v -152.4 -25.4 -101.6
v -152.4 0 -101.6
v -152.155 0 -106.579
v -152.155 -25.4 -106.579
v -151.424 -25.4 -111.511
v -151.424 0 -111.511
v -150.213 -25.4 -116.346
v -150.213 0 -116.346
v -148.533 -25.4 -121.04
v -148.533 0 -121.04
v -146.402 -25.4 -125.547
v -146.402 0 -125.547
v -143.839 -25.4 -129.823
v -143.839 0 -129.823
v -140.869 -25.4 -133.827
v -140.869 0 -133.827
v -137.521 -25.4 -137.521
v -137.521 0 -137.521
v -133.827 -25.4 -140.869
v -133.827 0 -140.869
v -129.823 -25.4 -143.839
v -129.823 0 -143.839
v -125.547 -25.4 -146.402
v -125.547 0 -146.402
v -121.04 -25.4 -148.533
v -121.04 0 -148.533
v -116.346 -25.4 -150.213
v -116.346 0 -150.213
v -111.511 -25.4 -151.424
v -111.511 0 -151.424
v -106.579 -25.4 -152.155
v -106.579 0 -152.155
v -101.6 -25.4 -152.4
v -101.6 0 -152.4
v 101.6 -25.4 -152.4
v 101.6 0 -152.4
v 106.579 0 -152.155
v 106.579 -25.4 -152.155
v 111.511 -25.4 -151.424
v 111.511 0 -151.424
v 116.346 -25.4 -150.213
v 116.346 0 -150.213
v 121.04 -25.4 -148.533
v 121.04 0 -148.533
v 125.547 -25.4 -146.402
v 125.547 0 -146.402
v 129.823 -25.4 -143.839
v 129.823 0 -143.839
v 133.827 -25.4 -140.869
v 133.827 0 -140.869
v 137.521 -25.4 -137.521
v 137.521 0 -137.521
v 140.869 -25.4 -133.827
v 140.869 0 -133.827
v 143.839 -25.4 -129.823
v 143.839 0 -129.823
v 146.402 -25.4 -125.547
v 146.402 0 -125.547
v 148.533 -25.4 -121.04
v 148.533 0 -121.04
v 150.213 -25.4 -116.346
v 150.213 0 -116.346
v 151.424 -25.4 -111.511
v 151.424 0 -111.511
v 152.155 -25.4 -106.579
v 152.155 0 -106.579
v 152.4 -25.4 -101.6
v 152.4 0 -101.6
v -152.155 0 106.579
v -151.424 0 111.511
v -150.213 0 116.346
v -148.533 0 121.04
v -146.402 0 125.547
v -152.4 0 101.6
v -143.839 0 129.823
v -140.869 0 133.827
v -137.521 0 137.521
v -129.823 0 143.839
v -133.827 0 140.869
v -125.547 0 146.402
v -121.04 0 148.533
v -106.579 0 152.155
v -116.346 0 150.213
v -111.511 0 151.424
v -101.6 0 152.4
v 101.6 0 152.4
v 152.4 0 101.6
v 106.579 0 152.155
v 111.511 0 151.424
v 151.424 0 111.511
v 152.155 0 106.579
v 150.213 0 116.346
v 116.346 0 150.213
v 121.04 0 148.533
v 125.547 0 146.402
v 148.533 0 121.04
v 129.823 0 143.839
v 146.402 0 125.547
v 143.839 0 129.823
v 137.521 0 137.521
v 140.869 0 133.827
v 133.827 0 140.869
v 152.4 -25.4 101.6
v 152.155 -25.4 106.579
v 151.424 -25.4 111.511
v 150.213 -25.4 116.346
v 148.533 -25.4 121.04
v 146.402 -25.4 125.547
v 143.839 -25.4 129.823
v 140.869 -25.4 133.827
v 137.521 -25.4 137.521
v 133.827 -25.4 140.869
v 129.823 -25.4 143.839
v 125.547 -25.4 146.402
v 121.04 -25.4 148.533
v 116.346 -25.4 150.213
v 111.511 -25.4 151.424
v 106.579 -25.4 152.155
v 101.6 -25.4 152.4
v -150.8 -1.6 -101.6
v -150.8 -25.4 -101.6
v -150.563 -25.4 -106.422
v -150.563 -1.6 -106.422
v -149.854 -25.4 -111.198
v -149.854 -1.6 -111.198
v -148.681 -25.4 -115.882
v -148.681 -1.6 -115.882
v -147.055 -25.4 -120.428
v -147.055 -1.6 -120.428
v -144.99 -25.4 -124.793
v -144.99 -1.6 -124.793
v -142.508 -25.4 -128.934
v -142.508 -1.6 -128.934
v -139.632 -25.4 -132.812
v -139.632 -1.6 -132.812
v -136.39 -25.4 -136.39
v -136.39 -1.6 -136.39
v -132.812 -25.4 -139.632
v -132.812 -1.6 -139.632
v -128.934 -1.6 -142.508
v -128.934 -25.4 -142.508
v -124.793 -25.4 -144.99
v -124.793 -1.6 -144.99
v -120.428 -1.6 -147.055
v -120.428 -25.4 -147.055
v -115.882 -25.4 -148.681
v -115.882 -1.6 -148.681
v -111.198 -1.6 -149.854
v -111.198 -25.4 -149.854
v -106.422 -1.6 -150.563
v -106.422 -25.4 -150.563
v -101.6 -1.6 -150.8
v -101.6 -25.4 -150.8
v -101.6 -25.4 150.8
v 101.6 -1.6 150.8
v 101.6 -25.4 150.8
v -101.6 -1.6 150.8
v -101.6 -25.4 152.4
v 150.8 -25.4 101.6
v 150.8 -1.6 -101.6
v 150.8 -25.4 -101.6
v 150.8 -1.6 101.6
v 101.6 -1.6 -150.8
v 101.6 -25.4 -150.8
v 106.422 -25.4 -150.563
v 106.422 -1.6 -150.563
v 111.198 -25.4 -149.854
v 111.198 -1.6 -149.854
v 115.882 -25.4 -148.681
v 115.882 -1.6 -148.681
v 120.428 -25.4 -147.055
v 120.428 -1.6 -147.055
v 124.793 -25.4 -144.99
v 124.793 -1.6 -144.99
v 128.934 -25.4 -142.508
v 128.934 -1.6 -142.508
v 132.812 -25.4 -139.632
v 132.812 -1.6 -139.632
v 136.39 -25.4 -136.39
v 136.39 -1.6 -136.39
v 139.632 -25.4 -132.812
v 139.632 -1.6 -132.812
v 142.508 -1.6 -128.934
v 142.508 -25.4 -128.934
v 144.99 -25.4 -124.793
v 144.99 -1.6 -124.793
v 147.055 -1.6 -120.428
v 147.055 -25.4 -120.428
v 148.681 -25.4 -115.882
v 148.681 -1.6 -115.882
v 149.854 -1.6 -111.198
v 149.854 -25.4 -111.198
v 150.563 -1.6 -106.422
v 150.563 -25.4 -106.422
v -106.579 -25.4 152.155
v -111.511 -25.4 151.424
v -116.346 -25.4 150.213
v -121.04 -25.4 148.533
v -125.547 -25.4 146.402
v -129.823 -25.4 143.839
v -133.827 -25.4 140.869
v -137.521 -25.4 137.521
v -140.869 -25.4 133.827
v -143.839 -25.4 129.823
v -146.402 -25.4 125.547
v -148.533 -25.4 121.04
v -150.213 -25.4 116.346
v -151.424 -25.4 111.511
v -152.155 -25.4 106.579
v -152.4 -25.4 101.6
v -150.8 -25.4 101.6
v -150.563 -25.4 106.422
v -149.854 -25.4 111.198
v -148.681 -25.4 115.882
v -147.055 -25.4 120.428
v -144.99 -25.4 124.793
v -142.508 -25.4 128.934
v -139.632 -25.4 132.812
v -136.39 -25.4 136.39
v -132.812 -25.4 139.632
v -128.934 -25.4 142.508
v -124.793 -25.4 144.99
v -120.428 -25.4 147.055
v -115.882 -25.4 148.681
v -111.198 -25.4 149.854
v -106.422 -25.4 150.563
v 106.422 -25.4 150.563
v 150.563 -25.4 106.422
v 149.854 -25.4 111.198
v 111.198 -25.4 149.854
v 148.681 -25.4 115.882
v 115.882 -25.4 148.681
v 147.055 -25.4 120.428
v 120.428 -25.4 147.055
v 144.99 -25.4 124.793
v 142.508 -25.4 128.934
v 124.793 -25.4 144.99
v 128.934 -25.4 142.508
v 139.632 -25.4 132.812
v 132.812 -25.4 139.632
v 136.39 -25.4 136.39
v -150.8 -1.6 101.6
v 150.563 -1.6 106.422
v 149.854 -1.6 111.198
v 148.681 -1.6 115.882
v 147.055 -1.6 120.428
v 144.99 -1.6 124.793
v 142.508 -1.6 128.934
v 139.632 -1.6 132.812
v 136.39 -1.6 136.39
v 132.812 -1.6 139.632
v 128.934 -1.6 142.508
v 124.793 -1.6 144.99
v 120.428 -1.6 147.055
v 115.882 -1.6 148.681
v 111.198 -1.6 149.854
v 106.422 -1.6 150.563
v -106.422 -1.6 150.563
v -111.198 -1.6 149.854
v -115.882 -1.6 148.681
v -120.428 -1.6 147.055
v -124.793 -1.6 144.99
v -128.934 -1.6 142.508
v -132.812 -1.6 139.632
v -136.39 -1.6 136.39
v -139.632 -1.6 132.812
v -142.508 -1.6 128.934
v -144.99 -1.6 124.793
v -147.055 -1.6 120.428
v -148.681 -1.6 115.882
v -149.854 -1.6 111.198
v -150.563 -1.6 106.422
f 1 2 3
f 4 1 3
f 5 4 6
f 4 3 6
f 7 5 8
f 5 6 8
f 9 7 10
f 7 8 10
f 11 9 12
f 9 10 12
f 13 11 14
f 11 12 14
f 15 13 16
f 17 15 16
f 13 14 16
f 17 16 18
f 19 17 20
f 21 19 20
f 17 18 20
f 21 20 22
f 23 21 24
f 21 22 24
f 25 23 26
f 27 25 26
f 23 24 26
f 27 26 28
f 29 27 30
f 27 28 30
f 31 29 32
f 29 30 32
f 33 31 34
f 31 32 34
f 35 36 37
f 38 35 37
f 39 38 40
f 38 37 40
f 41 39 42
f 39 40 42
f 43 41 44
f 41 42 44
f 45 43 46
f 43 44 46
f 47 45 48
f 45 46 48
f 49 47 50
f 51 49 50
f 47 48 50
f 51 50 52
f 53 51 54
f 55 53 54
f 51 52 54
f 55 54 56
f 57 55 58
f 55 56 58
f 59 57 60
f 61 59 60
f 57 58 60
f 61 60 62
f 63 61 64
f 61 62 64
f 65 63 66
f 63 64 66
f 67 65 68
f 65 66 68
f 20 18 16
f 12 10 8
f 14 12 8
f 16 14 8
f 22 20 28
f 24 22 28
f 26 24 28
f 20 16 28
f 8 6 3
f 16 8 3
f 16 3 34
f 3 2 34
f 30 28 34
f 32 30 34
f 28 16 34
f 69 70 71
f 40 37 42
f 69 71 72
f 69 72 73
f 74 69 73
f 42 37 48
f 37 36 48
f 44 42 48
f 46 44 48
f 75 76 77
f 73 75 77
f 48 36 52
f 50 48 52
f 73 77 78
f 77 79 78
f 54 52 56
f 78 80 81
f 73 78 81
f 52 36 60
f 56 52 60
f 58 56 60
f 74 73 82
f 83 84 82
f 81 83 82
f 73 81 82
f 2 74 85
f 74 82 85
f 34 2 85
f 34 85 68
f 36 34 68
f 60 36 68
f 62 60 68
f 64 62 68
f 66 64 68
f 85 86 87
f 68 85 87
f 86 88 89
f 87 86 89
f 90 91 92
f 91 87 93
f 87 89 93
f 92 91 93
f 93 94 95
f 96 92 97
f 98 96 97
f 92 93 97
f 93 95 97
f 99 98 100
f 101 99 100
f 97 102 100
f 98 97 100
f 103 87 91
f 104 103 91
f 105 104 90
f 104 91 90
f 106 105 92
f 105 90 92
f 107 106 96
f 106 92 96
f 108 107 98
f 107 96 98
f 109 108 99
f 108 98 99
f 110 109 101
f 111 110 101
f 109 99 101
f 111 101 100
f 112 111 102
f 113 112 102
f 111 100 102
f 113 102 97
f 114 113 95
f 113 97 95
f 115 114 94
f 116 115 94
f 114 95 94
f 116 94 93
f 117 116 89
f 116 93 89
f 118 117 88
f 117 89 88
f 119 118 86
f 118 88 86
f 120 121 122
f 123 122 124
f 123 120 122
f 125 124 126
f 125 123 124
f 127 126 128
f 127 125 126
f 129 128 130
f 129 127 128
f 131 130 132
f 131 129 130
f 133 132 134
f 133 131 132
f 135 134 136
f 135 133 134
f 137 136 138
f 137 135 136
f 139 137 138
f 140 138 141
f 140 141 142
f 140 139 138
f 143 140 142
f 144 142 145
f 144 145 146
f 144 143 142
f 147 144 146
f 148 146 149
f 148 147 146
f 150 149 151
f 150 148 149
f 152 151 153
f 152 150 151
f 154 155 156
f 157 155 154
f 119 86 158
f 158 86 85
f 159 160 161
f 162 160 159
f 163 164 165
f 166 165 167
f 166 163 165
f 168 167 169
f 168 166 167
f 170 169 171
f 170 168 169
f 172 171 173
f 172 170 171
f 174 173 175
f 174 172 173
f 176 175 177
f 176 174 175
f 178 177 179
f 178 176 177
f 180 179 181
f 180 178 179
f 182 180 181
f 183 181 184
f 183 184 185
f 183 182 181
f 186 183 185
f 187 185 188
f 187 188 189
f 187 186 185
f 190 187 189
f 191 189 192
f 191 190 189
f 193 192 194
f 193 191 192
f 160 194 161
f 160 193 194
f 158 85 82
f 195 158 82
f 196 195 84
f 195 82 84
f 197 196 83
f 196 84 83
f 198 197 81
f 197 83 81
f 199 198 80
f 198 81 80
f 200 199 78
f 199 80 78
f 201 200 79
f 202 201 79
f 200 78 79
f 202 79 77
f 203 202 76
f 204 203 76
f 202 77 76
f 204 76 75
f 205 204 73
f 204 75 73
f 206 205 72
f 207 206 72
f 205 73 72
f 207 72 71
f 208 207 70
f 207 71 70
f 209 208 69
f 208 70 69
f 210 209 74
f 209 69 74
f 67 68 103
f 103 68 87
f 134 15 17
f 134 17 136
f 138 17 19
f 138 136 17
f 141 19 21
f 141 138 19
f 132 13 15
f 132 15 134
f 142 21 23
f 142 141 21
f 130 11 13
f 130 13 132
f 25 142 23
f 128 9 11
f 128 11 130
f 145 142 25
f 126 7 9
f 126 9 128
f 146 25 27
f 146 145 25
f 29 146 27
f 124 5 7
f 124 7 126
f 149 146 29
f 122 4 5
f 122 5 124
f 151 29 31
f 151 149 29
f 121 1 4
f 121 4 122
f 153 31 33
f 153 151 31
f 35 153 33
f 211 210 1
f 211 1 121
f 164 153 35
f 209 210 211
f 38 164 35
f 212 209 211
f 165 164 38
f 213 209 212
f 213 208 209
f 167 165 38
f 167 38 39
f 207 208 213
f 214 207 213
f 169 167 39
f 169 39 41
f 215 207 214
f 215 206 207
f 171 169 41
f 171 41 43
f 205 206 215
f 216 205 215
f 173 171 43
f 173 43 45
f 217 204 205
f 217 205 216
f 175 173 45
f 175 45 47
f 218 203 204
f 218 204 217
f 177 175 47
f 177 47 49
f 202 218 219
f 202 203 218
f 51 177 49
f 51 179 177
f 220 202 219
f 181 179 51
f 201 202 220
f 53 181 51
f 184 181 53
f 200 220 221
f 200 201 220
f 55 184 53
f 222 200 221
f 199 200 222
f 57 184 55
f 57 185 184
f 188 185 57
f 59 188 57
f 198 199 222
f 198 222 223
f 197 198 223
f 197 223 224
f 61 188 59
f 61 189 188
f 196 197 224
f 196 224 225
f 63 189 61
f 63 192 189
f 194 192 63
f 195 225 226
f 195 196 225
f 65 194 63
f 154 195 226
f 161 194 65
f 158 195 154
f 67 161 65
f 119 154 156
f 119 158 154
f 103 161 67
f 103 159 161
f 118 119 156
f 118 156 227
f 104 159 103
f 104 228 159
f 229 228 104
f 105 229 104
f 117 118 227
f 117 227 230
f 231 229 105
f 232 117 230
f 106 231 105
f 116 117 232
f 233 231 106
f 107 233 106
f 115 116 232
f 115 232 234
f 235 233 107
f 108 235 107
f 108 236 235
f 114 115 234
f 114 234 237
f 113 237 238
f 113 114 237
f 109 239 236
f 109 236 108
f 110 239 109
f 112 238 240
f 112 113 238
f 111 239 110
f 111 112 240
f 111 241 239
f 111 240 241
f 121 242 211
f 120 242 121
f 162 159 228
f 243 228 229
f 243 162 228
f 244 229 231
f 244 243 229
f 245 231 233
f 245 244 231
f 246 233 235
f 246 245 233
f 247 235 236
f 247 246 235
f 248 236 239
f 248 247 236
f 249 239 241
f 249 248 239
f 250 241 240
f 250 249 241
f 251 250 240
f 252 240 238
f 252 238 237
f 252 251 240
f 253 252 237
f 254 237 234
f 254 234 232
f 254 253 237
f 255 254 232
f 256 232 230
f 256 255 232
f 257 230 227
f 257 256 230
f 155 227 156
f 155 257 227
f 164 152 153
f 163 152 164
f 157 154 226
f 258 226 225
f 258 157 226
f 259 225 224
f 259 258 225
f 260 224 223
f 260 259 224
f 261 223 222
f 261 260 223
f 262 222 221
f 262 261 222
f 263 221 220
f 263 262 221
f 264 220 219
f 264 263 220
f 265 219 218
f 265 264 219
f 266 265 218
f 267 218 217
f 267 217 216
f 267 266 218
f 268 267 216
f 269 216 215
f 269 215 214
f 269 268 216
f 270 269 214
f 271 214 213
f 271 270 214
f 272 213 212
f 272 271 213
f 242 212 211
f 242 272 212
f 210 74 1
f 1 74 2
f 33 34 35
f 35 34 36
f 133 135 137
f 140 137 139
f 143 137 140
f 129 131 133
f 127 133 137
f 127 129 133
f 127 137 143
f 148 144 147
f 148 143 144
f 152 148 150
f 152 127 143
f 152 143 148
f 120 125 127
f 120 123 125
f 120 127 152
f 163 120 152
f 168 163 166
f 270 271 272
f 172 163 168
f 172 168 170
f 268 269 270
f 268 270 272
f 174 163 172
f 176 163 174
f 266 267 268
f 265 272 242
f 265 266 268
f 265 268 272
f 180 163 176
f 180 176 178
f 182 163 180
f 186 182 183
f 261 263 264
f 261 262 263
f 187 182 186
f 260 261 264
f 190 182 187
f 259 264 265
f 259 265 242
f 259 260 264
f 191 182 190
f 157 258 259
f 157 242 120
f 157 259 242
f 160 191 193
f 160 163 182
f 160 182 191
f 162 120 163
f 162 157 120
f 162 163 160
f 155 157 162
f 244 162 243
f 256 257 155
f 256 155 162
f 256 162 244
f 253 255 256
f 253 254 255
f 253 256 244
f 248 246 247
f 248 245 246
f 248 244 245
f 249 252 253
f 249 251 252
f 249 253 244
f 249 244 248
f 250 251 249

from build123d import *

# Parameters (mm, degrees)
F1_DEPTH = 25.4
F2_T     = -1.6002


with BuildPart() as f1:
    # F0 (on Front) → F1 (new body)
    with BuildSketch(Plane.XZ):
        with BuildLine():
            ThreePointArc((152.4, 101.6), (137.521024, 137.521024), (101.6, 152.4))
            Line((101.6, 152.4), (-101.6, 152.4))
            ThreePointArc((-101.6, 152.4), (-137.521024, 137.521024), (-152.4, 101.6))
            Line((-152.4, 101.6), (-152.4, -101.6))
            ThreePointArc((-152.4, -101.6), (-137.521024, -137.521024), (-101.6, -152.4))
            Line((-101.6, -152.4), (101.6, -152.4))
            ThreePointArc((101.6, -152.4), (137.521024, -137.521024), (152.4, -101.6))
            Line((152.4, -101.6), (152.4, 101.6))
        make_face()
    extrude(amount=F1_DEPTH)

    # F2
    f2_openings = [f1.faces().sort_by_distance(p)[0] for p in [
        (0, -25.4, 0),
    ]]
    offset(amount=F2_T, openings=f2_openings)


solid = f1.part
